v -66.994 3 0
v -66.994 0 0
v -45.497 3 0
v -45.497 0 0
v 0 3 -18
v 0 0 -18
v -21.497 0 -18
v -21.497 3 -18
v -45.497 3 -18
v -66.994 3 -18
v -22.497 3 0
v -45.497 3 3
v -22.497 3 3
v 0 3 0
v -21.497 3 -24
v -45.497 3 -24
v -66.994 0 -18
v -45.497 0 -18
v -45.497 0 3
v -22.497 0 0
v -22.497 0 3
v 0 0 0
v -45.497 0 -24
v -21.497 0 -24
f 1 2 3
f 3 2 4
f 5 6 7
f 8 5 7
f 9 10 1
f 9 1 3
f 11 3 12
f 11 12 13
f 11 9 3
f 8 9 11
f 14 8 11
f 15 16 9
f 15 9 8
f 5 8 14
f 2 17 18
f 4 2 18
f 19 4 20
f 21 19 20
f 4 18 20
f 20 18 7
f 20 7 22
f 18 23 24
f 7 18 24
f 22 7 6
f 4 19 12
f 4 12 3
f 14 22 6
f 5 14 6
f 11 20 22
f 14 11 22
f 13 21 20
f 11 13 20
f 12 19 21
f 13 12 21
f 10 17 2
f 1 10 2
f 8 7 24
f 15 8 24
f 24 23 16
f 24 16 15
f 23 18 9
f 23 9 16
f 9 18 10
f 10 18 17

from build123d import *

# Parameters (mm, degrees)
SKETCH1_W           = 24
SKETCH1_H           = 6
SKETCH1_W_2         = 23
SKETCH1_H_2         = 3
BOSS_EXTRUDE1_DEPTH = 3


with BuildPart() as part:
    # Sketch1 → Boss-Extrude1 (new body)
    with BuildSketch(Plane(origin=(0, 0, 0), x_dir=(1, 0, 0), z_dir=(0, 1, 0))):
        Polygon((-45.497230944, 18), (-66.994461887, 18), (-66.994461887, 0), (-45.497230944, 0), (-22.497230944, 0), (-21.497230944, 0), (0, 0), (0, 18), (-21.497230944, 18), align=None)
        with Locations((-33.497230944, 21)):
            Rectangle(SKETCH1_W, SKETCH1_H)
        with Locations((-33.997230944, -1.5)):
            Rectangle(SKETCH1_W_2, SKETCH1_H_2)
    extrude(amount=BOSS_EXTRUDE1_DEPTH)


solid = part.part
